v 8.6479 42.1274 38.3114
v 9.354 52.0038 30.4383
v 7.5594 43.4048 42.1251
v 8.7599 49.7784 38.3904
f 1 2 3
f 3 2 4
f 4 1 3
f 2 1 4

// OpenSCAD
// Auto-generated auxetic polyhedron
points = [
    [7.559356, 43.404779, 42.125124],
    [9.354020, 52.003844, 30.438275],
    [8.647947, 42.127375, 38.311441],
    [8.759867, 49.778370, 38.390449],
];

faces = [
    [0, 1, 2],
    [3, 1, 0],
    [0, 2, 3],
    [3, 2, 1],
];

polyhedron(points = points, faces = faces);
